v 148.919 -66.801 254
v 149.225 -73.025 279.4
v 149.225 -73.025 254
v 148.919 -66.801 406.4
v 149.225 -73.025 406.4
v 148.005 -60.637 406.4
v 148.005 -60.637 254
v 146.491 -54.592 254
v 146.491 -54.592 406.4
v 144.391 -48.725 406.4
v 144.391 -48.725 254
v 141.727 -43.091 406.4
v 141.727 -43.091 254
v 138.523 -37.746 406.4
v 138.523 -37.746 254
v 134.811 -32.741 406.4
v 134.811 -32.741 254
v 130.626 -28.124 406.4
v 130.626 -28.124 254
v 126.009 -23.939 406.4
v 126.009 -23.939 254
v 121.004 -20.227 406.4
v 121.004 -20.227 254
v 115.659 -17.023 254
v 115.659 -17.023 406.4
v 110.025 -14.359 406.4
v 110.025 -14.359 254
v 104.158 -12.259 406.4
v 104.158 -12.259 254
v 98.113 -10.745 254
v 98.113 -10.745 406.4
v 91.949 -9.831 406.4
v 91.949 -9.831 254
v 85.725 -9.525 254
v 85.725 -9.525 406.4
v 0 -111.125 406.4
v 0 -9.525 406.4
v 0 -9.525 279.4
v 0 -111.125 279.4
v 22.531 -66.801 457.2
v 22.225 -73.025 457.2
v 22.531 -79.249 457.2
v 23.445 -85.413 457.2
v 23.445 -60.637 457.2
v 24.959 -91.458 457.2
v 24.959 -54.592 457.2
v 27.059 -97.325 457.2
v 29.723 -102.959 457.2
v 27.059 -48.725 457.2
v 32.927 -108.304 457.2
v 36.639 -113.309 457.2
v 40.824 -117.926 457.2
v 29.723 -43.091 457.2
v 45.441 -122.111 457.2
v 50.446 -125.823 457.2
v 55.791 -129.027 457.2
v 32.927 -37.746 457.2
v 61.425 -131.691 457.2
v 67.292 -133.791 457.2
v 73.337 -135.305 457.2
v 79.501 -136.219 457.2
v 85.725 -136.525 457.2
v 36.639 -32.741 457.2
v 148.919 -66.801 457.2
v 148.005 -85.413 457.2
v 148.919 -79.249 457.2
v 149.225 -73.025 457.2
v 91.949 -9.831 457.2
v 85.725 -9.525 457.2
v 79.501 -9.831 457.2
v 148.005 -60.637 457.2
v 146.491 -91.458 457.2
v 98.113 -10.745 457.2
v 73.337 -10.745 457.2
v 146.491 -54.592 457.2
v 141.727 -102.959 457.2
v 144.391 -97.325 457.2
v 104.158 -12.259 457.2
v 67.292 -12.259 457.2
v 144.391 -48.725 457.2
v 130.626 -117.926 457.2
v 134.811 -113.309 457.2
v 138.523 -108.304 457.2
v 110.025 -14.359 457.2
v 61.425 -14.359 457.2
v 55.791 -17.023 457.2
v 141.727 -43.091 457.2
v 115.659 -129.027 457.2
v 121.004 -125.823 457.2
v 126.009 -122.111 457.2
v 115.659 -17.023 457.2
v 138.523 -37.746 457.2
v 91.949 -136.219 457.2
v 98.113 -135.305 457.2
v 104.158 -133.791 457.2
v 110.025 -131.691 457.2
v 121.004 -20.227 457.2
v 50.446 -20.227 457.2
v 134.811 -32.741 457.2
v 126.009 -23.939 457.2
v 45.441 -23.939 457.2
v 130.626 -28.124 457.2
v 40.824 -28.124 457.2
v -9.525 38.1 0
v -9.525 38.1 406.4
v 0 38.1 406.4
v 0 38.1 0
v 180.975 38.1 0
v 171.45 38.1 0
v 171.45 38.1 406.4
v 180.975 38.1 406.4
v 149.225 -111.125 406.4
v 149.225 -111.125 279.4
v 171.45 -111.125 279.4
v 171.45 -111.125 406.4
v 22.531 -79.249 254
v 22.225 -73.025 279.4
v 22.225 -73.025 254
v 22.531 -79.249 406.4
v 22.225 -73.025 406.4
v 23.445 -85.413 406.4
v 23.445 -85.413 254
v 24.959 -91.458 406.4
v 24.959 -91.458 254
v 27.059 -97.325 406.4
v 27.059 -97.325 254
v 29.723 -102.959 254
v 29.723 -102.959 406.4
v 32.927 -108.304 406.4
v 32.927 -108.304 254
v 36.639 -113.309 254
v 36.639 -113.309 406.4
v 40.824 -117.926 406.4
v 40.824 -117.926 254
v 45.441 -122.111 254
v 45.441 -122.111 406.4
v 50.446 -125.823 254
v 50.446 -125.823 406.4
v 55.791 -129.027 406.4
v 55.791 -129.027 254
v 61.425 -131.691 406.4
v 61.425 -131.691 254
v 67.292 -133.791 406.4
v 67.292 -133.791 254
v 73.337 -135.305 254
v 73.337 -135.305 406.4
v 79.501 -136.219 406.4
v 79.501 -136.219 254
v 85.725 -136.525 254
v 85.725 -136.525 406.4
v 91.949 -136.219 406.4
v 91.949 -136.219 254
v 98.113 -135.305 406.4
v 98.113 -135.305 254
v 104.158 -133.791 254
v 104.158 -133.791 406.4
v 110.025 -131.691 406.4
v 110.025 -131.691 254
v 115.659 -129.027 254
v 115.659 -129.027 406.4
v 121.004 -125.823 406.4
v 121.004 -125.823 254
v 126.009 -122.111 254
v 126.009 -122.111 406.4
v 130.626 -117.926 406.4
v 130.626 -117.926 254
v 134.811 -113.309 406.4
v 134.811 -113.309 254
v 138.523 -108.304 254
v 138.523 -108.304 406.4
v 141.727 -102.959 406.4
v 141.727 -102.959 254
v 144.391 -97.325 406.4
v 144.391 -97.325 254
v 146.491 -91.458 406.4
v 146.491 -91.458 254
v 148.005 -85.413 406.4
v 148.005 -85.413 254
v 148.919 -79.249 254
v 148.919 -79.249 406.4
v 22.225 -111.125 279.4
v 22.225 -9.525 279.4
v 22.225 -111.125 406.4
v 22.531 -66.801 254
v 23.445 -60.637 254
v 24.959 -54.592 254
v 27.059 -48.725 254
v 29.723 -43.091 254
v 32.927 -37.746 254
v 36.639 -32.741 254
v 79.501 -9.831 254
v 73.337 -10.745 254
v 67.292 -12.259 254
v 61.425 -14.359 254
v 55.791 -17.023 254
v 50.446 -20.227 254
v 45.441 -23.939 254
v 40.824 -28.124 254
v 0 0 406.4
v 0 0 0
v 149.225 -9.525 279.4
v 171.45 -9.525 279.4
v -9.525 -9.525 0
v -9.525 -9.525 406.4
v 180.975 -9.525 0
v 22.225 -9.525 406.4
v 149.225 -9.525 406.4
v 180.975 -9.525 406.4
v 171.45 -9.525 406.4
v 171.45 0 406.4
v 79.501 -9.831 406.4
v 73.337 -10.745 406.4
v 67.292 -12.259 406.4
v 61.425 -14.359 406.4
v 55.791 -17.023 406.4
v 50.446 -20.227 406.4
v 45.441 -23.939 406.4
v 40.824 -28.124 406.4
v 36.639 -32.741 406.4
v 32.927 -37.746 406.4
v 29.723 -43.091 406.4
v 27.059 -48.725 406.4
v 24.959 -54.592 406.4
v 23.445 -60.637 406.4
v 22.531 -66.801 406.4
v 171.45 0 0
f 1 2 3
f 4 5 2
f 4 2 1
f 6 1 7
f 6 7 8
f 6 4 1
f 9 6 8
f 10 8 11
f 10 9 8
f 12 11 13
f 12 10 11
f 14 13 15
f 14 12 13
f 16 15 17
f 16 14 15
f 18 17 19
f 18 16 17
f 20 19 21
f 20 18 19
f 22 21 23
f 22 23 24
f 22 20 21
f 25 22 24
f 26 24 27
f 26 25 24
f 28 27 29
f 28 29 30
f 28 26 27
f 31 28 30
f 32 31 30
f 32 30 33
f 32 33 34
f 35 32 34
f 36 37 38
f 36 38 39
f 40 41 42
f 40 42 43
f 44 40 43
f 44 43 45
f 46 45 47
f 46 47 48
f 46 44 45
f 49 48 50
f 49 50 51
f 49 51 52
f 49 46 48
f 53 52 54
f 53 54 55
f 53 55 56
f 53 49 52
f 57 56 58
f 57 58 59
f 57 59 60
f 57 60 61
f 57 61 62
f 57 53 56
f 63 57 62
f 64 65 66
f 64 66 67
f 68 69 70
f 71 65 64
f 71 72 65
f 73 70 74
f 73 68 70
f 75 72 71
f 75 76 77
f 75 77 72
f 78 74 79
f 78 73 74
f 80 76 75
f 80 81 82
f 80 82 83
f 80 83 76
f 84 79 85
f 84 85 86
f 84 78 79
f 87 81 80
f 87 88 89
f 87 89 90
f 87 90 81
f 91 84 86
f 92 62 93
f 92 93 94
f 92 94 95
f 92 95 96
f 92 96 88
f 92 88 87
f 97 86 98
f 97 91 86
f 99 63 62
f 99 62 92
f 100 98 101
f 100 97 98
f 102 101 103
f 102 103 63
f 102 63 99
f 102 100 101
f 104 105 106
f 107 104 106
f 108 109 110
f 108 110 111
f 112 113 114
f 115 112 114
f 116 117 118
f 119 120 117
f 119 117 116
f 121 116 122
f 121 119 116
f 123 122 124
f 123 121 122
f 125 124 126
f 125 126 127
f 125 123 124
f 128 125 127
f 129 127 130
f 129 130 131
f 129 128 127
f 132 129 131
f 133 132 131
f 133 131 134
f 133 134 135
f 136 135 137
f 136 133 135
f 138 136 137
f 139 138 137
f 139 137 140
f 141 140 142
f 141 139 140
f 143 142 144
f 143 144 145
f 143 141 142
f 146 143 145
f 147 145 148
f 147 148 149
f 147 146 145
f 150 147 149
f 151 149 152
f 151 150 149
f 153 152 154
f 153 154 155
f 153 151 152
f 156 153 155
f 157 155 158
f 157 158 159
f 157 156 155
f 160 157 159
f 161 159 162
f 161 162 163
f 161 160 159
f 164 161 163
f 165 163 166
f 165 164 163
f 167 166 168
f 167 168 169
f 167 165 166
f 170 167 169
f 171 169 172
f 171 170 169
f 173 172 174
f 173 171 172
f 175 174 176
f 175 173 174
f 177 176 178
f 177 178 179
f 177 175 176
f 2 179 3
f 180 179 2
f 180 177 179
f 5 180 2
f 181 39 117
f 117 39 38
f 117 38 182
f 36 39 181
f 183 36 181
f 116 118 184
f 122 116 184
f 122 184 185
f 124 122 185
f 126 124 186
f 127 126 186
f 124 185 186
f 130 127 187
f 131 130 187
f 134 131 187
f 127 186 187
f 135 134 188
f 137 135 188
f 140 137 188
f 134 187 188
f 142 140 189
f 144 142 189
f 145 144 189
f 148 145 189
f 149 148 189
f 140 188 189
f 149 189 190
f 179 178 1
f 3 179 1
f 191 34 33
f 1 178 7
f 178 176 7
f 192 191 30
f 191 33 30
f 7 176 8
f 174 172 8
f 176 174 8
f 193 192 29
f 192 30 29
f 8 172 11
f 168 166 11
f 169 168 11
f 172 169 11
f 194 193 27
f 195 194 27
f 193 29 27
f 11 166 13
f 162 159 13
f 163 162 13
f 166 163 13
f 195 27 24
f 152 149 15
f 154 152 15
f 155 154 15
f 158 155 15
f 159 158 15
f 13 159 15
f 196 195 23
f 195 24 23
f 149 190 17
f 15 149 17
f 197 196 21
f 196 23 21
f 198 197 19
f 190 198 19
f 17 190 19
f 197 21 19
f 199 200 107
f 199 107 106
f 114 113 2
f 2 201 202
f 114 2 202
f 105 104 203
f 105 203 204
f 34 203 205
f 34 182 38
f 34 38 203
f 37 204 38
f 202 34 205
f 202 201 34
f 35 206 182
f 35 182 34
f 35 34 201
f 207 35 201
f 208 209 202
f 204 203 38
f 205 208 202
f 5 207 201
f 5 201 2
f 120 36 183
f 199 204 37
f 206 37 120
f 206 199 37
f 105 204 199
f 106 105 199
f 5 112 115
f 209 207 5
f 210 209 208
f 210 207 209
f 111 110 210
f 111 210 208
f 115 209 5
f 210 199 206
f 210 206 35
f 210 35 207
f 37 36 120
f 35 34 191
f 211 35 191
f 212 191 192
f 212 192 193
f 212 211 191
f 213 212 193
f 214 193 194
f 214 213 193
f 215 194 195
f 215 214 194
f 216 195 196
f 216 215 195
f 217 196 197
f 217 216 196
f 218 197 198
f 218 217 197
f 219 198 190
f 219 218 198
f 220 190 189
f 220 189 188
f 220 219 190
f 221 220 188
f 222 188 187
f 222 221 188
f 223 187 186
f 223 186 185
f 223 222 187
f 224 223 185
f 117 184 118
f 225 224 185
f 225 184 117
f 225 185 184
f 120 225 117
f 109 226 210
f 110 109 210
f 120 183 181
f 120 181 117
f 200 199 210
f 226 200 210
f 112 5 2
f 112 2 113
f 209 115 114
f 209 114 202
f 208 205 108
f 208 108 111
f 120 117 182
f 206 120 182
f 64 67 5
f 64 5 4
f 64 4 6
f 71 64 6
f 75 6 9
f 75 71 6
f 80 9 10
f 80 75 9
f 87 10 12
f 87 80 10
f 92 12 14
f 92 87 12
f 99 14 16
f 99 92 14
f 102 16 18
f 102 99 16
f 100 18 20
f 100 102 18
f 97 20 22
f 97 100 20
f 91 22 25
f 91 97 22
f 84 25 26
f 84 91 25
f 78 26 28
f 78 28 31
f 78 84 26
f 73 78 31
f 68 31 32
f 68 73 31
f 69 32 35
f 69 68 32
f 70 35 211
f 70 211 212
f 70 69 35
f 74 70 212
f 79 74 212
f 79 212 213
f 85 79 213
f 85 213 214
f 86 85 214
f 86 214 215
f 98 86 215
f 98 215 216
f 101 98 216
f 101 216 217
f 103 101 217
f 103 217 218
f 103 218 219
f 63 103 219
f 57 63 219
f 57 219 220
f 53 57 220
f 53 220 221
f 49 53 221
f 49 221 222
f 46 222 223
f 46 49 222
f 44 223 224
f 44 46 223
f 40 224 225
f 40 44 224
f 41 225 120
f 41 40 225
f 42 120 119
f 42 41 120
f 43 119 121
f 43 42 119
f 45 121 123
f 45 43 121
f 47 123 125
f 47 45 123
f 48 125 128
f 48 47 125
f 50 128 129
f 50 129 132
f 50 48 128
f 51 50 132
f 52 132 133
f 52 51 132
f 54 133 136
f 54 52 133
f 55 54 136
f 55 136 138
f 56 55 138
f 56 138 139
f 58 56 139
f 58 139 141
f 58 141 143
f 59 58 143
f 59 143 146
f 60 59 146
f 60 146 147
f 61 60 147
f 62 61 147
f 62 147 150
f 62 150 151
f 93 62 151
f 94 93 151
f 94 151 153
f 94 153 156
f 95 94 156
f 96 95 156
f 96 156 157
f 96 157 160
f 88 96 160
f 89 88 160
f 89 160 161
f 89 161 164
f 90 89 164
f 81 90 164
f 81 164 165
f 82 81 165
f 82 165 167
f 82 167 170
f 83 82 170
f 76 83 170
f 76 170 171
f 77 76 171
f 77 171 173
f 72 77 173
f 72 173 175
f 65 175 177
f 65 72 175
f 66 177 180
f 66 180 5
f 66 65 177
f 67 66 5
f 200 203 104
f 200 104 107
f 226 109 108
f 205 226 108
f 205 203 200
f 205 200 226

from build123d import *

# Parameters (mm, degrees)
F0_W          = 9.525
F0_H          = 406.4
F0_W_2        = 171.45
F1_DEPTH      = 9.525
F2_DEPTH      = 38.1
F4_DEPTH      = 152.4
F4_DEPTH_BACK = 50.8
F5_DEPTH      = 127


with BuildPart() as f1:
    # F0 (on Front) → F1 (new body)
    with BuildSketch(Plane.XZ):
        with Locations((-4.7625, 203.2)):
            Rectangle(F0_W, F0_H)
        with Locations((85.725, 203.2)):
            Rectangle(F0_W_2, F0_H)
        with Locations((176.2125, 203.2)):
            Rectangle(F0_W, F0_H)
    extrude(amount=F1_DEPTH)

    # F0 (on Front) → F2 (join)
    with BuildSketch(Plane.XZ):
        with Locations((176.2125, 203.2)):
            Rectangle(F0_W, F0_H)
        with Locations((-4.7625, 203.2)):
            Rectangle(F0_W, F0_H)
    extrude(amount=-F2_DEPTH)

    # F3 (on face) → F4 (join, two sides)
    with BuildSketch(Plane.XY.offset(406.4)) as f4_sk:
        with BuildLine():
            ThreePointArc((85.725, -9.525), (40.8237193947, -28.1237193947), (22.225, -73.025))
            ThreePointArc((22.225, -73.025), (85.725, -136.525), (149.225, -73.025))
            ThreePointArc((149.225, -73.025), (130.6262806053, -28.1237193947), (85.725, -9.525))
        make_face()
    extrude(amount=-F4_DEPTH)
    extrude(f4_sk.sketch, amount=F4_DEPTH_BACK)

    # F3 (on face) → F5 (join)
    with BuildSketch(Plane.XY.offset(406.4)):
        Polygon((149.225, -9.525), (149.225, -73.025), (149.225, -111.125), (149.7277021408, -111.125), (171.45, -111.125), (171.45, -9.525), align=None)
        Polygon((22.225, -111.125), (22.225, -73.025), (22.225, -9.525), (0, -9.525), (0, -111.125), align=None)
    extrude(amount=-F5_DEPTH)


solid = f1.part
